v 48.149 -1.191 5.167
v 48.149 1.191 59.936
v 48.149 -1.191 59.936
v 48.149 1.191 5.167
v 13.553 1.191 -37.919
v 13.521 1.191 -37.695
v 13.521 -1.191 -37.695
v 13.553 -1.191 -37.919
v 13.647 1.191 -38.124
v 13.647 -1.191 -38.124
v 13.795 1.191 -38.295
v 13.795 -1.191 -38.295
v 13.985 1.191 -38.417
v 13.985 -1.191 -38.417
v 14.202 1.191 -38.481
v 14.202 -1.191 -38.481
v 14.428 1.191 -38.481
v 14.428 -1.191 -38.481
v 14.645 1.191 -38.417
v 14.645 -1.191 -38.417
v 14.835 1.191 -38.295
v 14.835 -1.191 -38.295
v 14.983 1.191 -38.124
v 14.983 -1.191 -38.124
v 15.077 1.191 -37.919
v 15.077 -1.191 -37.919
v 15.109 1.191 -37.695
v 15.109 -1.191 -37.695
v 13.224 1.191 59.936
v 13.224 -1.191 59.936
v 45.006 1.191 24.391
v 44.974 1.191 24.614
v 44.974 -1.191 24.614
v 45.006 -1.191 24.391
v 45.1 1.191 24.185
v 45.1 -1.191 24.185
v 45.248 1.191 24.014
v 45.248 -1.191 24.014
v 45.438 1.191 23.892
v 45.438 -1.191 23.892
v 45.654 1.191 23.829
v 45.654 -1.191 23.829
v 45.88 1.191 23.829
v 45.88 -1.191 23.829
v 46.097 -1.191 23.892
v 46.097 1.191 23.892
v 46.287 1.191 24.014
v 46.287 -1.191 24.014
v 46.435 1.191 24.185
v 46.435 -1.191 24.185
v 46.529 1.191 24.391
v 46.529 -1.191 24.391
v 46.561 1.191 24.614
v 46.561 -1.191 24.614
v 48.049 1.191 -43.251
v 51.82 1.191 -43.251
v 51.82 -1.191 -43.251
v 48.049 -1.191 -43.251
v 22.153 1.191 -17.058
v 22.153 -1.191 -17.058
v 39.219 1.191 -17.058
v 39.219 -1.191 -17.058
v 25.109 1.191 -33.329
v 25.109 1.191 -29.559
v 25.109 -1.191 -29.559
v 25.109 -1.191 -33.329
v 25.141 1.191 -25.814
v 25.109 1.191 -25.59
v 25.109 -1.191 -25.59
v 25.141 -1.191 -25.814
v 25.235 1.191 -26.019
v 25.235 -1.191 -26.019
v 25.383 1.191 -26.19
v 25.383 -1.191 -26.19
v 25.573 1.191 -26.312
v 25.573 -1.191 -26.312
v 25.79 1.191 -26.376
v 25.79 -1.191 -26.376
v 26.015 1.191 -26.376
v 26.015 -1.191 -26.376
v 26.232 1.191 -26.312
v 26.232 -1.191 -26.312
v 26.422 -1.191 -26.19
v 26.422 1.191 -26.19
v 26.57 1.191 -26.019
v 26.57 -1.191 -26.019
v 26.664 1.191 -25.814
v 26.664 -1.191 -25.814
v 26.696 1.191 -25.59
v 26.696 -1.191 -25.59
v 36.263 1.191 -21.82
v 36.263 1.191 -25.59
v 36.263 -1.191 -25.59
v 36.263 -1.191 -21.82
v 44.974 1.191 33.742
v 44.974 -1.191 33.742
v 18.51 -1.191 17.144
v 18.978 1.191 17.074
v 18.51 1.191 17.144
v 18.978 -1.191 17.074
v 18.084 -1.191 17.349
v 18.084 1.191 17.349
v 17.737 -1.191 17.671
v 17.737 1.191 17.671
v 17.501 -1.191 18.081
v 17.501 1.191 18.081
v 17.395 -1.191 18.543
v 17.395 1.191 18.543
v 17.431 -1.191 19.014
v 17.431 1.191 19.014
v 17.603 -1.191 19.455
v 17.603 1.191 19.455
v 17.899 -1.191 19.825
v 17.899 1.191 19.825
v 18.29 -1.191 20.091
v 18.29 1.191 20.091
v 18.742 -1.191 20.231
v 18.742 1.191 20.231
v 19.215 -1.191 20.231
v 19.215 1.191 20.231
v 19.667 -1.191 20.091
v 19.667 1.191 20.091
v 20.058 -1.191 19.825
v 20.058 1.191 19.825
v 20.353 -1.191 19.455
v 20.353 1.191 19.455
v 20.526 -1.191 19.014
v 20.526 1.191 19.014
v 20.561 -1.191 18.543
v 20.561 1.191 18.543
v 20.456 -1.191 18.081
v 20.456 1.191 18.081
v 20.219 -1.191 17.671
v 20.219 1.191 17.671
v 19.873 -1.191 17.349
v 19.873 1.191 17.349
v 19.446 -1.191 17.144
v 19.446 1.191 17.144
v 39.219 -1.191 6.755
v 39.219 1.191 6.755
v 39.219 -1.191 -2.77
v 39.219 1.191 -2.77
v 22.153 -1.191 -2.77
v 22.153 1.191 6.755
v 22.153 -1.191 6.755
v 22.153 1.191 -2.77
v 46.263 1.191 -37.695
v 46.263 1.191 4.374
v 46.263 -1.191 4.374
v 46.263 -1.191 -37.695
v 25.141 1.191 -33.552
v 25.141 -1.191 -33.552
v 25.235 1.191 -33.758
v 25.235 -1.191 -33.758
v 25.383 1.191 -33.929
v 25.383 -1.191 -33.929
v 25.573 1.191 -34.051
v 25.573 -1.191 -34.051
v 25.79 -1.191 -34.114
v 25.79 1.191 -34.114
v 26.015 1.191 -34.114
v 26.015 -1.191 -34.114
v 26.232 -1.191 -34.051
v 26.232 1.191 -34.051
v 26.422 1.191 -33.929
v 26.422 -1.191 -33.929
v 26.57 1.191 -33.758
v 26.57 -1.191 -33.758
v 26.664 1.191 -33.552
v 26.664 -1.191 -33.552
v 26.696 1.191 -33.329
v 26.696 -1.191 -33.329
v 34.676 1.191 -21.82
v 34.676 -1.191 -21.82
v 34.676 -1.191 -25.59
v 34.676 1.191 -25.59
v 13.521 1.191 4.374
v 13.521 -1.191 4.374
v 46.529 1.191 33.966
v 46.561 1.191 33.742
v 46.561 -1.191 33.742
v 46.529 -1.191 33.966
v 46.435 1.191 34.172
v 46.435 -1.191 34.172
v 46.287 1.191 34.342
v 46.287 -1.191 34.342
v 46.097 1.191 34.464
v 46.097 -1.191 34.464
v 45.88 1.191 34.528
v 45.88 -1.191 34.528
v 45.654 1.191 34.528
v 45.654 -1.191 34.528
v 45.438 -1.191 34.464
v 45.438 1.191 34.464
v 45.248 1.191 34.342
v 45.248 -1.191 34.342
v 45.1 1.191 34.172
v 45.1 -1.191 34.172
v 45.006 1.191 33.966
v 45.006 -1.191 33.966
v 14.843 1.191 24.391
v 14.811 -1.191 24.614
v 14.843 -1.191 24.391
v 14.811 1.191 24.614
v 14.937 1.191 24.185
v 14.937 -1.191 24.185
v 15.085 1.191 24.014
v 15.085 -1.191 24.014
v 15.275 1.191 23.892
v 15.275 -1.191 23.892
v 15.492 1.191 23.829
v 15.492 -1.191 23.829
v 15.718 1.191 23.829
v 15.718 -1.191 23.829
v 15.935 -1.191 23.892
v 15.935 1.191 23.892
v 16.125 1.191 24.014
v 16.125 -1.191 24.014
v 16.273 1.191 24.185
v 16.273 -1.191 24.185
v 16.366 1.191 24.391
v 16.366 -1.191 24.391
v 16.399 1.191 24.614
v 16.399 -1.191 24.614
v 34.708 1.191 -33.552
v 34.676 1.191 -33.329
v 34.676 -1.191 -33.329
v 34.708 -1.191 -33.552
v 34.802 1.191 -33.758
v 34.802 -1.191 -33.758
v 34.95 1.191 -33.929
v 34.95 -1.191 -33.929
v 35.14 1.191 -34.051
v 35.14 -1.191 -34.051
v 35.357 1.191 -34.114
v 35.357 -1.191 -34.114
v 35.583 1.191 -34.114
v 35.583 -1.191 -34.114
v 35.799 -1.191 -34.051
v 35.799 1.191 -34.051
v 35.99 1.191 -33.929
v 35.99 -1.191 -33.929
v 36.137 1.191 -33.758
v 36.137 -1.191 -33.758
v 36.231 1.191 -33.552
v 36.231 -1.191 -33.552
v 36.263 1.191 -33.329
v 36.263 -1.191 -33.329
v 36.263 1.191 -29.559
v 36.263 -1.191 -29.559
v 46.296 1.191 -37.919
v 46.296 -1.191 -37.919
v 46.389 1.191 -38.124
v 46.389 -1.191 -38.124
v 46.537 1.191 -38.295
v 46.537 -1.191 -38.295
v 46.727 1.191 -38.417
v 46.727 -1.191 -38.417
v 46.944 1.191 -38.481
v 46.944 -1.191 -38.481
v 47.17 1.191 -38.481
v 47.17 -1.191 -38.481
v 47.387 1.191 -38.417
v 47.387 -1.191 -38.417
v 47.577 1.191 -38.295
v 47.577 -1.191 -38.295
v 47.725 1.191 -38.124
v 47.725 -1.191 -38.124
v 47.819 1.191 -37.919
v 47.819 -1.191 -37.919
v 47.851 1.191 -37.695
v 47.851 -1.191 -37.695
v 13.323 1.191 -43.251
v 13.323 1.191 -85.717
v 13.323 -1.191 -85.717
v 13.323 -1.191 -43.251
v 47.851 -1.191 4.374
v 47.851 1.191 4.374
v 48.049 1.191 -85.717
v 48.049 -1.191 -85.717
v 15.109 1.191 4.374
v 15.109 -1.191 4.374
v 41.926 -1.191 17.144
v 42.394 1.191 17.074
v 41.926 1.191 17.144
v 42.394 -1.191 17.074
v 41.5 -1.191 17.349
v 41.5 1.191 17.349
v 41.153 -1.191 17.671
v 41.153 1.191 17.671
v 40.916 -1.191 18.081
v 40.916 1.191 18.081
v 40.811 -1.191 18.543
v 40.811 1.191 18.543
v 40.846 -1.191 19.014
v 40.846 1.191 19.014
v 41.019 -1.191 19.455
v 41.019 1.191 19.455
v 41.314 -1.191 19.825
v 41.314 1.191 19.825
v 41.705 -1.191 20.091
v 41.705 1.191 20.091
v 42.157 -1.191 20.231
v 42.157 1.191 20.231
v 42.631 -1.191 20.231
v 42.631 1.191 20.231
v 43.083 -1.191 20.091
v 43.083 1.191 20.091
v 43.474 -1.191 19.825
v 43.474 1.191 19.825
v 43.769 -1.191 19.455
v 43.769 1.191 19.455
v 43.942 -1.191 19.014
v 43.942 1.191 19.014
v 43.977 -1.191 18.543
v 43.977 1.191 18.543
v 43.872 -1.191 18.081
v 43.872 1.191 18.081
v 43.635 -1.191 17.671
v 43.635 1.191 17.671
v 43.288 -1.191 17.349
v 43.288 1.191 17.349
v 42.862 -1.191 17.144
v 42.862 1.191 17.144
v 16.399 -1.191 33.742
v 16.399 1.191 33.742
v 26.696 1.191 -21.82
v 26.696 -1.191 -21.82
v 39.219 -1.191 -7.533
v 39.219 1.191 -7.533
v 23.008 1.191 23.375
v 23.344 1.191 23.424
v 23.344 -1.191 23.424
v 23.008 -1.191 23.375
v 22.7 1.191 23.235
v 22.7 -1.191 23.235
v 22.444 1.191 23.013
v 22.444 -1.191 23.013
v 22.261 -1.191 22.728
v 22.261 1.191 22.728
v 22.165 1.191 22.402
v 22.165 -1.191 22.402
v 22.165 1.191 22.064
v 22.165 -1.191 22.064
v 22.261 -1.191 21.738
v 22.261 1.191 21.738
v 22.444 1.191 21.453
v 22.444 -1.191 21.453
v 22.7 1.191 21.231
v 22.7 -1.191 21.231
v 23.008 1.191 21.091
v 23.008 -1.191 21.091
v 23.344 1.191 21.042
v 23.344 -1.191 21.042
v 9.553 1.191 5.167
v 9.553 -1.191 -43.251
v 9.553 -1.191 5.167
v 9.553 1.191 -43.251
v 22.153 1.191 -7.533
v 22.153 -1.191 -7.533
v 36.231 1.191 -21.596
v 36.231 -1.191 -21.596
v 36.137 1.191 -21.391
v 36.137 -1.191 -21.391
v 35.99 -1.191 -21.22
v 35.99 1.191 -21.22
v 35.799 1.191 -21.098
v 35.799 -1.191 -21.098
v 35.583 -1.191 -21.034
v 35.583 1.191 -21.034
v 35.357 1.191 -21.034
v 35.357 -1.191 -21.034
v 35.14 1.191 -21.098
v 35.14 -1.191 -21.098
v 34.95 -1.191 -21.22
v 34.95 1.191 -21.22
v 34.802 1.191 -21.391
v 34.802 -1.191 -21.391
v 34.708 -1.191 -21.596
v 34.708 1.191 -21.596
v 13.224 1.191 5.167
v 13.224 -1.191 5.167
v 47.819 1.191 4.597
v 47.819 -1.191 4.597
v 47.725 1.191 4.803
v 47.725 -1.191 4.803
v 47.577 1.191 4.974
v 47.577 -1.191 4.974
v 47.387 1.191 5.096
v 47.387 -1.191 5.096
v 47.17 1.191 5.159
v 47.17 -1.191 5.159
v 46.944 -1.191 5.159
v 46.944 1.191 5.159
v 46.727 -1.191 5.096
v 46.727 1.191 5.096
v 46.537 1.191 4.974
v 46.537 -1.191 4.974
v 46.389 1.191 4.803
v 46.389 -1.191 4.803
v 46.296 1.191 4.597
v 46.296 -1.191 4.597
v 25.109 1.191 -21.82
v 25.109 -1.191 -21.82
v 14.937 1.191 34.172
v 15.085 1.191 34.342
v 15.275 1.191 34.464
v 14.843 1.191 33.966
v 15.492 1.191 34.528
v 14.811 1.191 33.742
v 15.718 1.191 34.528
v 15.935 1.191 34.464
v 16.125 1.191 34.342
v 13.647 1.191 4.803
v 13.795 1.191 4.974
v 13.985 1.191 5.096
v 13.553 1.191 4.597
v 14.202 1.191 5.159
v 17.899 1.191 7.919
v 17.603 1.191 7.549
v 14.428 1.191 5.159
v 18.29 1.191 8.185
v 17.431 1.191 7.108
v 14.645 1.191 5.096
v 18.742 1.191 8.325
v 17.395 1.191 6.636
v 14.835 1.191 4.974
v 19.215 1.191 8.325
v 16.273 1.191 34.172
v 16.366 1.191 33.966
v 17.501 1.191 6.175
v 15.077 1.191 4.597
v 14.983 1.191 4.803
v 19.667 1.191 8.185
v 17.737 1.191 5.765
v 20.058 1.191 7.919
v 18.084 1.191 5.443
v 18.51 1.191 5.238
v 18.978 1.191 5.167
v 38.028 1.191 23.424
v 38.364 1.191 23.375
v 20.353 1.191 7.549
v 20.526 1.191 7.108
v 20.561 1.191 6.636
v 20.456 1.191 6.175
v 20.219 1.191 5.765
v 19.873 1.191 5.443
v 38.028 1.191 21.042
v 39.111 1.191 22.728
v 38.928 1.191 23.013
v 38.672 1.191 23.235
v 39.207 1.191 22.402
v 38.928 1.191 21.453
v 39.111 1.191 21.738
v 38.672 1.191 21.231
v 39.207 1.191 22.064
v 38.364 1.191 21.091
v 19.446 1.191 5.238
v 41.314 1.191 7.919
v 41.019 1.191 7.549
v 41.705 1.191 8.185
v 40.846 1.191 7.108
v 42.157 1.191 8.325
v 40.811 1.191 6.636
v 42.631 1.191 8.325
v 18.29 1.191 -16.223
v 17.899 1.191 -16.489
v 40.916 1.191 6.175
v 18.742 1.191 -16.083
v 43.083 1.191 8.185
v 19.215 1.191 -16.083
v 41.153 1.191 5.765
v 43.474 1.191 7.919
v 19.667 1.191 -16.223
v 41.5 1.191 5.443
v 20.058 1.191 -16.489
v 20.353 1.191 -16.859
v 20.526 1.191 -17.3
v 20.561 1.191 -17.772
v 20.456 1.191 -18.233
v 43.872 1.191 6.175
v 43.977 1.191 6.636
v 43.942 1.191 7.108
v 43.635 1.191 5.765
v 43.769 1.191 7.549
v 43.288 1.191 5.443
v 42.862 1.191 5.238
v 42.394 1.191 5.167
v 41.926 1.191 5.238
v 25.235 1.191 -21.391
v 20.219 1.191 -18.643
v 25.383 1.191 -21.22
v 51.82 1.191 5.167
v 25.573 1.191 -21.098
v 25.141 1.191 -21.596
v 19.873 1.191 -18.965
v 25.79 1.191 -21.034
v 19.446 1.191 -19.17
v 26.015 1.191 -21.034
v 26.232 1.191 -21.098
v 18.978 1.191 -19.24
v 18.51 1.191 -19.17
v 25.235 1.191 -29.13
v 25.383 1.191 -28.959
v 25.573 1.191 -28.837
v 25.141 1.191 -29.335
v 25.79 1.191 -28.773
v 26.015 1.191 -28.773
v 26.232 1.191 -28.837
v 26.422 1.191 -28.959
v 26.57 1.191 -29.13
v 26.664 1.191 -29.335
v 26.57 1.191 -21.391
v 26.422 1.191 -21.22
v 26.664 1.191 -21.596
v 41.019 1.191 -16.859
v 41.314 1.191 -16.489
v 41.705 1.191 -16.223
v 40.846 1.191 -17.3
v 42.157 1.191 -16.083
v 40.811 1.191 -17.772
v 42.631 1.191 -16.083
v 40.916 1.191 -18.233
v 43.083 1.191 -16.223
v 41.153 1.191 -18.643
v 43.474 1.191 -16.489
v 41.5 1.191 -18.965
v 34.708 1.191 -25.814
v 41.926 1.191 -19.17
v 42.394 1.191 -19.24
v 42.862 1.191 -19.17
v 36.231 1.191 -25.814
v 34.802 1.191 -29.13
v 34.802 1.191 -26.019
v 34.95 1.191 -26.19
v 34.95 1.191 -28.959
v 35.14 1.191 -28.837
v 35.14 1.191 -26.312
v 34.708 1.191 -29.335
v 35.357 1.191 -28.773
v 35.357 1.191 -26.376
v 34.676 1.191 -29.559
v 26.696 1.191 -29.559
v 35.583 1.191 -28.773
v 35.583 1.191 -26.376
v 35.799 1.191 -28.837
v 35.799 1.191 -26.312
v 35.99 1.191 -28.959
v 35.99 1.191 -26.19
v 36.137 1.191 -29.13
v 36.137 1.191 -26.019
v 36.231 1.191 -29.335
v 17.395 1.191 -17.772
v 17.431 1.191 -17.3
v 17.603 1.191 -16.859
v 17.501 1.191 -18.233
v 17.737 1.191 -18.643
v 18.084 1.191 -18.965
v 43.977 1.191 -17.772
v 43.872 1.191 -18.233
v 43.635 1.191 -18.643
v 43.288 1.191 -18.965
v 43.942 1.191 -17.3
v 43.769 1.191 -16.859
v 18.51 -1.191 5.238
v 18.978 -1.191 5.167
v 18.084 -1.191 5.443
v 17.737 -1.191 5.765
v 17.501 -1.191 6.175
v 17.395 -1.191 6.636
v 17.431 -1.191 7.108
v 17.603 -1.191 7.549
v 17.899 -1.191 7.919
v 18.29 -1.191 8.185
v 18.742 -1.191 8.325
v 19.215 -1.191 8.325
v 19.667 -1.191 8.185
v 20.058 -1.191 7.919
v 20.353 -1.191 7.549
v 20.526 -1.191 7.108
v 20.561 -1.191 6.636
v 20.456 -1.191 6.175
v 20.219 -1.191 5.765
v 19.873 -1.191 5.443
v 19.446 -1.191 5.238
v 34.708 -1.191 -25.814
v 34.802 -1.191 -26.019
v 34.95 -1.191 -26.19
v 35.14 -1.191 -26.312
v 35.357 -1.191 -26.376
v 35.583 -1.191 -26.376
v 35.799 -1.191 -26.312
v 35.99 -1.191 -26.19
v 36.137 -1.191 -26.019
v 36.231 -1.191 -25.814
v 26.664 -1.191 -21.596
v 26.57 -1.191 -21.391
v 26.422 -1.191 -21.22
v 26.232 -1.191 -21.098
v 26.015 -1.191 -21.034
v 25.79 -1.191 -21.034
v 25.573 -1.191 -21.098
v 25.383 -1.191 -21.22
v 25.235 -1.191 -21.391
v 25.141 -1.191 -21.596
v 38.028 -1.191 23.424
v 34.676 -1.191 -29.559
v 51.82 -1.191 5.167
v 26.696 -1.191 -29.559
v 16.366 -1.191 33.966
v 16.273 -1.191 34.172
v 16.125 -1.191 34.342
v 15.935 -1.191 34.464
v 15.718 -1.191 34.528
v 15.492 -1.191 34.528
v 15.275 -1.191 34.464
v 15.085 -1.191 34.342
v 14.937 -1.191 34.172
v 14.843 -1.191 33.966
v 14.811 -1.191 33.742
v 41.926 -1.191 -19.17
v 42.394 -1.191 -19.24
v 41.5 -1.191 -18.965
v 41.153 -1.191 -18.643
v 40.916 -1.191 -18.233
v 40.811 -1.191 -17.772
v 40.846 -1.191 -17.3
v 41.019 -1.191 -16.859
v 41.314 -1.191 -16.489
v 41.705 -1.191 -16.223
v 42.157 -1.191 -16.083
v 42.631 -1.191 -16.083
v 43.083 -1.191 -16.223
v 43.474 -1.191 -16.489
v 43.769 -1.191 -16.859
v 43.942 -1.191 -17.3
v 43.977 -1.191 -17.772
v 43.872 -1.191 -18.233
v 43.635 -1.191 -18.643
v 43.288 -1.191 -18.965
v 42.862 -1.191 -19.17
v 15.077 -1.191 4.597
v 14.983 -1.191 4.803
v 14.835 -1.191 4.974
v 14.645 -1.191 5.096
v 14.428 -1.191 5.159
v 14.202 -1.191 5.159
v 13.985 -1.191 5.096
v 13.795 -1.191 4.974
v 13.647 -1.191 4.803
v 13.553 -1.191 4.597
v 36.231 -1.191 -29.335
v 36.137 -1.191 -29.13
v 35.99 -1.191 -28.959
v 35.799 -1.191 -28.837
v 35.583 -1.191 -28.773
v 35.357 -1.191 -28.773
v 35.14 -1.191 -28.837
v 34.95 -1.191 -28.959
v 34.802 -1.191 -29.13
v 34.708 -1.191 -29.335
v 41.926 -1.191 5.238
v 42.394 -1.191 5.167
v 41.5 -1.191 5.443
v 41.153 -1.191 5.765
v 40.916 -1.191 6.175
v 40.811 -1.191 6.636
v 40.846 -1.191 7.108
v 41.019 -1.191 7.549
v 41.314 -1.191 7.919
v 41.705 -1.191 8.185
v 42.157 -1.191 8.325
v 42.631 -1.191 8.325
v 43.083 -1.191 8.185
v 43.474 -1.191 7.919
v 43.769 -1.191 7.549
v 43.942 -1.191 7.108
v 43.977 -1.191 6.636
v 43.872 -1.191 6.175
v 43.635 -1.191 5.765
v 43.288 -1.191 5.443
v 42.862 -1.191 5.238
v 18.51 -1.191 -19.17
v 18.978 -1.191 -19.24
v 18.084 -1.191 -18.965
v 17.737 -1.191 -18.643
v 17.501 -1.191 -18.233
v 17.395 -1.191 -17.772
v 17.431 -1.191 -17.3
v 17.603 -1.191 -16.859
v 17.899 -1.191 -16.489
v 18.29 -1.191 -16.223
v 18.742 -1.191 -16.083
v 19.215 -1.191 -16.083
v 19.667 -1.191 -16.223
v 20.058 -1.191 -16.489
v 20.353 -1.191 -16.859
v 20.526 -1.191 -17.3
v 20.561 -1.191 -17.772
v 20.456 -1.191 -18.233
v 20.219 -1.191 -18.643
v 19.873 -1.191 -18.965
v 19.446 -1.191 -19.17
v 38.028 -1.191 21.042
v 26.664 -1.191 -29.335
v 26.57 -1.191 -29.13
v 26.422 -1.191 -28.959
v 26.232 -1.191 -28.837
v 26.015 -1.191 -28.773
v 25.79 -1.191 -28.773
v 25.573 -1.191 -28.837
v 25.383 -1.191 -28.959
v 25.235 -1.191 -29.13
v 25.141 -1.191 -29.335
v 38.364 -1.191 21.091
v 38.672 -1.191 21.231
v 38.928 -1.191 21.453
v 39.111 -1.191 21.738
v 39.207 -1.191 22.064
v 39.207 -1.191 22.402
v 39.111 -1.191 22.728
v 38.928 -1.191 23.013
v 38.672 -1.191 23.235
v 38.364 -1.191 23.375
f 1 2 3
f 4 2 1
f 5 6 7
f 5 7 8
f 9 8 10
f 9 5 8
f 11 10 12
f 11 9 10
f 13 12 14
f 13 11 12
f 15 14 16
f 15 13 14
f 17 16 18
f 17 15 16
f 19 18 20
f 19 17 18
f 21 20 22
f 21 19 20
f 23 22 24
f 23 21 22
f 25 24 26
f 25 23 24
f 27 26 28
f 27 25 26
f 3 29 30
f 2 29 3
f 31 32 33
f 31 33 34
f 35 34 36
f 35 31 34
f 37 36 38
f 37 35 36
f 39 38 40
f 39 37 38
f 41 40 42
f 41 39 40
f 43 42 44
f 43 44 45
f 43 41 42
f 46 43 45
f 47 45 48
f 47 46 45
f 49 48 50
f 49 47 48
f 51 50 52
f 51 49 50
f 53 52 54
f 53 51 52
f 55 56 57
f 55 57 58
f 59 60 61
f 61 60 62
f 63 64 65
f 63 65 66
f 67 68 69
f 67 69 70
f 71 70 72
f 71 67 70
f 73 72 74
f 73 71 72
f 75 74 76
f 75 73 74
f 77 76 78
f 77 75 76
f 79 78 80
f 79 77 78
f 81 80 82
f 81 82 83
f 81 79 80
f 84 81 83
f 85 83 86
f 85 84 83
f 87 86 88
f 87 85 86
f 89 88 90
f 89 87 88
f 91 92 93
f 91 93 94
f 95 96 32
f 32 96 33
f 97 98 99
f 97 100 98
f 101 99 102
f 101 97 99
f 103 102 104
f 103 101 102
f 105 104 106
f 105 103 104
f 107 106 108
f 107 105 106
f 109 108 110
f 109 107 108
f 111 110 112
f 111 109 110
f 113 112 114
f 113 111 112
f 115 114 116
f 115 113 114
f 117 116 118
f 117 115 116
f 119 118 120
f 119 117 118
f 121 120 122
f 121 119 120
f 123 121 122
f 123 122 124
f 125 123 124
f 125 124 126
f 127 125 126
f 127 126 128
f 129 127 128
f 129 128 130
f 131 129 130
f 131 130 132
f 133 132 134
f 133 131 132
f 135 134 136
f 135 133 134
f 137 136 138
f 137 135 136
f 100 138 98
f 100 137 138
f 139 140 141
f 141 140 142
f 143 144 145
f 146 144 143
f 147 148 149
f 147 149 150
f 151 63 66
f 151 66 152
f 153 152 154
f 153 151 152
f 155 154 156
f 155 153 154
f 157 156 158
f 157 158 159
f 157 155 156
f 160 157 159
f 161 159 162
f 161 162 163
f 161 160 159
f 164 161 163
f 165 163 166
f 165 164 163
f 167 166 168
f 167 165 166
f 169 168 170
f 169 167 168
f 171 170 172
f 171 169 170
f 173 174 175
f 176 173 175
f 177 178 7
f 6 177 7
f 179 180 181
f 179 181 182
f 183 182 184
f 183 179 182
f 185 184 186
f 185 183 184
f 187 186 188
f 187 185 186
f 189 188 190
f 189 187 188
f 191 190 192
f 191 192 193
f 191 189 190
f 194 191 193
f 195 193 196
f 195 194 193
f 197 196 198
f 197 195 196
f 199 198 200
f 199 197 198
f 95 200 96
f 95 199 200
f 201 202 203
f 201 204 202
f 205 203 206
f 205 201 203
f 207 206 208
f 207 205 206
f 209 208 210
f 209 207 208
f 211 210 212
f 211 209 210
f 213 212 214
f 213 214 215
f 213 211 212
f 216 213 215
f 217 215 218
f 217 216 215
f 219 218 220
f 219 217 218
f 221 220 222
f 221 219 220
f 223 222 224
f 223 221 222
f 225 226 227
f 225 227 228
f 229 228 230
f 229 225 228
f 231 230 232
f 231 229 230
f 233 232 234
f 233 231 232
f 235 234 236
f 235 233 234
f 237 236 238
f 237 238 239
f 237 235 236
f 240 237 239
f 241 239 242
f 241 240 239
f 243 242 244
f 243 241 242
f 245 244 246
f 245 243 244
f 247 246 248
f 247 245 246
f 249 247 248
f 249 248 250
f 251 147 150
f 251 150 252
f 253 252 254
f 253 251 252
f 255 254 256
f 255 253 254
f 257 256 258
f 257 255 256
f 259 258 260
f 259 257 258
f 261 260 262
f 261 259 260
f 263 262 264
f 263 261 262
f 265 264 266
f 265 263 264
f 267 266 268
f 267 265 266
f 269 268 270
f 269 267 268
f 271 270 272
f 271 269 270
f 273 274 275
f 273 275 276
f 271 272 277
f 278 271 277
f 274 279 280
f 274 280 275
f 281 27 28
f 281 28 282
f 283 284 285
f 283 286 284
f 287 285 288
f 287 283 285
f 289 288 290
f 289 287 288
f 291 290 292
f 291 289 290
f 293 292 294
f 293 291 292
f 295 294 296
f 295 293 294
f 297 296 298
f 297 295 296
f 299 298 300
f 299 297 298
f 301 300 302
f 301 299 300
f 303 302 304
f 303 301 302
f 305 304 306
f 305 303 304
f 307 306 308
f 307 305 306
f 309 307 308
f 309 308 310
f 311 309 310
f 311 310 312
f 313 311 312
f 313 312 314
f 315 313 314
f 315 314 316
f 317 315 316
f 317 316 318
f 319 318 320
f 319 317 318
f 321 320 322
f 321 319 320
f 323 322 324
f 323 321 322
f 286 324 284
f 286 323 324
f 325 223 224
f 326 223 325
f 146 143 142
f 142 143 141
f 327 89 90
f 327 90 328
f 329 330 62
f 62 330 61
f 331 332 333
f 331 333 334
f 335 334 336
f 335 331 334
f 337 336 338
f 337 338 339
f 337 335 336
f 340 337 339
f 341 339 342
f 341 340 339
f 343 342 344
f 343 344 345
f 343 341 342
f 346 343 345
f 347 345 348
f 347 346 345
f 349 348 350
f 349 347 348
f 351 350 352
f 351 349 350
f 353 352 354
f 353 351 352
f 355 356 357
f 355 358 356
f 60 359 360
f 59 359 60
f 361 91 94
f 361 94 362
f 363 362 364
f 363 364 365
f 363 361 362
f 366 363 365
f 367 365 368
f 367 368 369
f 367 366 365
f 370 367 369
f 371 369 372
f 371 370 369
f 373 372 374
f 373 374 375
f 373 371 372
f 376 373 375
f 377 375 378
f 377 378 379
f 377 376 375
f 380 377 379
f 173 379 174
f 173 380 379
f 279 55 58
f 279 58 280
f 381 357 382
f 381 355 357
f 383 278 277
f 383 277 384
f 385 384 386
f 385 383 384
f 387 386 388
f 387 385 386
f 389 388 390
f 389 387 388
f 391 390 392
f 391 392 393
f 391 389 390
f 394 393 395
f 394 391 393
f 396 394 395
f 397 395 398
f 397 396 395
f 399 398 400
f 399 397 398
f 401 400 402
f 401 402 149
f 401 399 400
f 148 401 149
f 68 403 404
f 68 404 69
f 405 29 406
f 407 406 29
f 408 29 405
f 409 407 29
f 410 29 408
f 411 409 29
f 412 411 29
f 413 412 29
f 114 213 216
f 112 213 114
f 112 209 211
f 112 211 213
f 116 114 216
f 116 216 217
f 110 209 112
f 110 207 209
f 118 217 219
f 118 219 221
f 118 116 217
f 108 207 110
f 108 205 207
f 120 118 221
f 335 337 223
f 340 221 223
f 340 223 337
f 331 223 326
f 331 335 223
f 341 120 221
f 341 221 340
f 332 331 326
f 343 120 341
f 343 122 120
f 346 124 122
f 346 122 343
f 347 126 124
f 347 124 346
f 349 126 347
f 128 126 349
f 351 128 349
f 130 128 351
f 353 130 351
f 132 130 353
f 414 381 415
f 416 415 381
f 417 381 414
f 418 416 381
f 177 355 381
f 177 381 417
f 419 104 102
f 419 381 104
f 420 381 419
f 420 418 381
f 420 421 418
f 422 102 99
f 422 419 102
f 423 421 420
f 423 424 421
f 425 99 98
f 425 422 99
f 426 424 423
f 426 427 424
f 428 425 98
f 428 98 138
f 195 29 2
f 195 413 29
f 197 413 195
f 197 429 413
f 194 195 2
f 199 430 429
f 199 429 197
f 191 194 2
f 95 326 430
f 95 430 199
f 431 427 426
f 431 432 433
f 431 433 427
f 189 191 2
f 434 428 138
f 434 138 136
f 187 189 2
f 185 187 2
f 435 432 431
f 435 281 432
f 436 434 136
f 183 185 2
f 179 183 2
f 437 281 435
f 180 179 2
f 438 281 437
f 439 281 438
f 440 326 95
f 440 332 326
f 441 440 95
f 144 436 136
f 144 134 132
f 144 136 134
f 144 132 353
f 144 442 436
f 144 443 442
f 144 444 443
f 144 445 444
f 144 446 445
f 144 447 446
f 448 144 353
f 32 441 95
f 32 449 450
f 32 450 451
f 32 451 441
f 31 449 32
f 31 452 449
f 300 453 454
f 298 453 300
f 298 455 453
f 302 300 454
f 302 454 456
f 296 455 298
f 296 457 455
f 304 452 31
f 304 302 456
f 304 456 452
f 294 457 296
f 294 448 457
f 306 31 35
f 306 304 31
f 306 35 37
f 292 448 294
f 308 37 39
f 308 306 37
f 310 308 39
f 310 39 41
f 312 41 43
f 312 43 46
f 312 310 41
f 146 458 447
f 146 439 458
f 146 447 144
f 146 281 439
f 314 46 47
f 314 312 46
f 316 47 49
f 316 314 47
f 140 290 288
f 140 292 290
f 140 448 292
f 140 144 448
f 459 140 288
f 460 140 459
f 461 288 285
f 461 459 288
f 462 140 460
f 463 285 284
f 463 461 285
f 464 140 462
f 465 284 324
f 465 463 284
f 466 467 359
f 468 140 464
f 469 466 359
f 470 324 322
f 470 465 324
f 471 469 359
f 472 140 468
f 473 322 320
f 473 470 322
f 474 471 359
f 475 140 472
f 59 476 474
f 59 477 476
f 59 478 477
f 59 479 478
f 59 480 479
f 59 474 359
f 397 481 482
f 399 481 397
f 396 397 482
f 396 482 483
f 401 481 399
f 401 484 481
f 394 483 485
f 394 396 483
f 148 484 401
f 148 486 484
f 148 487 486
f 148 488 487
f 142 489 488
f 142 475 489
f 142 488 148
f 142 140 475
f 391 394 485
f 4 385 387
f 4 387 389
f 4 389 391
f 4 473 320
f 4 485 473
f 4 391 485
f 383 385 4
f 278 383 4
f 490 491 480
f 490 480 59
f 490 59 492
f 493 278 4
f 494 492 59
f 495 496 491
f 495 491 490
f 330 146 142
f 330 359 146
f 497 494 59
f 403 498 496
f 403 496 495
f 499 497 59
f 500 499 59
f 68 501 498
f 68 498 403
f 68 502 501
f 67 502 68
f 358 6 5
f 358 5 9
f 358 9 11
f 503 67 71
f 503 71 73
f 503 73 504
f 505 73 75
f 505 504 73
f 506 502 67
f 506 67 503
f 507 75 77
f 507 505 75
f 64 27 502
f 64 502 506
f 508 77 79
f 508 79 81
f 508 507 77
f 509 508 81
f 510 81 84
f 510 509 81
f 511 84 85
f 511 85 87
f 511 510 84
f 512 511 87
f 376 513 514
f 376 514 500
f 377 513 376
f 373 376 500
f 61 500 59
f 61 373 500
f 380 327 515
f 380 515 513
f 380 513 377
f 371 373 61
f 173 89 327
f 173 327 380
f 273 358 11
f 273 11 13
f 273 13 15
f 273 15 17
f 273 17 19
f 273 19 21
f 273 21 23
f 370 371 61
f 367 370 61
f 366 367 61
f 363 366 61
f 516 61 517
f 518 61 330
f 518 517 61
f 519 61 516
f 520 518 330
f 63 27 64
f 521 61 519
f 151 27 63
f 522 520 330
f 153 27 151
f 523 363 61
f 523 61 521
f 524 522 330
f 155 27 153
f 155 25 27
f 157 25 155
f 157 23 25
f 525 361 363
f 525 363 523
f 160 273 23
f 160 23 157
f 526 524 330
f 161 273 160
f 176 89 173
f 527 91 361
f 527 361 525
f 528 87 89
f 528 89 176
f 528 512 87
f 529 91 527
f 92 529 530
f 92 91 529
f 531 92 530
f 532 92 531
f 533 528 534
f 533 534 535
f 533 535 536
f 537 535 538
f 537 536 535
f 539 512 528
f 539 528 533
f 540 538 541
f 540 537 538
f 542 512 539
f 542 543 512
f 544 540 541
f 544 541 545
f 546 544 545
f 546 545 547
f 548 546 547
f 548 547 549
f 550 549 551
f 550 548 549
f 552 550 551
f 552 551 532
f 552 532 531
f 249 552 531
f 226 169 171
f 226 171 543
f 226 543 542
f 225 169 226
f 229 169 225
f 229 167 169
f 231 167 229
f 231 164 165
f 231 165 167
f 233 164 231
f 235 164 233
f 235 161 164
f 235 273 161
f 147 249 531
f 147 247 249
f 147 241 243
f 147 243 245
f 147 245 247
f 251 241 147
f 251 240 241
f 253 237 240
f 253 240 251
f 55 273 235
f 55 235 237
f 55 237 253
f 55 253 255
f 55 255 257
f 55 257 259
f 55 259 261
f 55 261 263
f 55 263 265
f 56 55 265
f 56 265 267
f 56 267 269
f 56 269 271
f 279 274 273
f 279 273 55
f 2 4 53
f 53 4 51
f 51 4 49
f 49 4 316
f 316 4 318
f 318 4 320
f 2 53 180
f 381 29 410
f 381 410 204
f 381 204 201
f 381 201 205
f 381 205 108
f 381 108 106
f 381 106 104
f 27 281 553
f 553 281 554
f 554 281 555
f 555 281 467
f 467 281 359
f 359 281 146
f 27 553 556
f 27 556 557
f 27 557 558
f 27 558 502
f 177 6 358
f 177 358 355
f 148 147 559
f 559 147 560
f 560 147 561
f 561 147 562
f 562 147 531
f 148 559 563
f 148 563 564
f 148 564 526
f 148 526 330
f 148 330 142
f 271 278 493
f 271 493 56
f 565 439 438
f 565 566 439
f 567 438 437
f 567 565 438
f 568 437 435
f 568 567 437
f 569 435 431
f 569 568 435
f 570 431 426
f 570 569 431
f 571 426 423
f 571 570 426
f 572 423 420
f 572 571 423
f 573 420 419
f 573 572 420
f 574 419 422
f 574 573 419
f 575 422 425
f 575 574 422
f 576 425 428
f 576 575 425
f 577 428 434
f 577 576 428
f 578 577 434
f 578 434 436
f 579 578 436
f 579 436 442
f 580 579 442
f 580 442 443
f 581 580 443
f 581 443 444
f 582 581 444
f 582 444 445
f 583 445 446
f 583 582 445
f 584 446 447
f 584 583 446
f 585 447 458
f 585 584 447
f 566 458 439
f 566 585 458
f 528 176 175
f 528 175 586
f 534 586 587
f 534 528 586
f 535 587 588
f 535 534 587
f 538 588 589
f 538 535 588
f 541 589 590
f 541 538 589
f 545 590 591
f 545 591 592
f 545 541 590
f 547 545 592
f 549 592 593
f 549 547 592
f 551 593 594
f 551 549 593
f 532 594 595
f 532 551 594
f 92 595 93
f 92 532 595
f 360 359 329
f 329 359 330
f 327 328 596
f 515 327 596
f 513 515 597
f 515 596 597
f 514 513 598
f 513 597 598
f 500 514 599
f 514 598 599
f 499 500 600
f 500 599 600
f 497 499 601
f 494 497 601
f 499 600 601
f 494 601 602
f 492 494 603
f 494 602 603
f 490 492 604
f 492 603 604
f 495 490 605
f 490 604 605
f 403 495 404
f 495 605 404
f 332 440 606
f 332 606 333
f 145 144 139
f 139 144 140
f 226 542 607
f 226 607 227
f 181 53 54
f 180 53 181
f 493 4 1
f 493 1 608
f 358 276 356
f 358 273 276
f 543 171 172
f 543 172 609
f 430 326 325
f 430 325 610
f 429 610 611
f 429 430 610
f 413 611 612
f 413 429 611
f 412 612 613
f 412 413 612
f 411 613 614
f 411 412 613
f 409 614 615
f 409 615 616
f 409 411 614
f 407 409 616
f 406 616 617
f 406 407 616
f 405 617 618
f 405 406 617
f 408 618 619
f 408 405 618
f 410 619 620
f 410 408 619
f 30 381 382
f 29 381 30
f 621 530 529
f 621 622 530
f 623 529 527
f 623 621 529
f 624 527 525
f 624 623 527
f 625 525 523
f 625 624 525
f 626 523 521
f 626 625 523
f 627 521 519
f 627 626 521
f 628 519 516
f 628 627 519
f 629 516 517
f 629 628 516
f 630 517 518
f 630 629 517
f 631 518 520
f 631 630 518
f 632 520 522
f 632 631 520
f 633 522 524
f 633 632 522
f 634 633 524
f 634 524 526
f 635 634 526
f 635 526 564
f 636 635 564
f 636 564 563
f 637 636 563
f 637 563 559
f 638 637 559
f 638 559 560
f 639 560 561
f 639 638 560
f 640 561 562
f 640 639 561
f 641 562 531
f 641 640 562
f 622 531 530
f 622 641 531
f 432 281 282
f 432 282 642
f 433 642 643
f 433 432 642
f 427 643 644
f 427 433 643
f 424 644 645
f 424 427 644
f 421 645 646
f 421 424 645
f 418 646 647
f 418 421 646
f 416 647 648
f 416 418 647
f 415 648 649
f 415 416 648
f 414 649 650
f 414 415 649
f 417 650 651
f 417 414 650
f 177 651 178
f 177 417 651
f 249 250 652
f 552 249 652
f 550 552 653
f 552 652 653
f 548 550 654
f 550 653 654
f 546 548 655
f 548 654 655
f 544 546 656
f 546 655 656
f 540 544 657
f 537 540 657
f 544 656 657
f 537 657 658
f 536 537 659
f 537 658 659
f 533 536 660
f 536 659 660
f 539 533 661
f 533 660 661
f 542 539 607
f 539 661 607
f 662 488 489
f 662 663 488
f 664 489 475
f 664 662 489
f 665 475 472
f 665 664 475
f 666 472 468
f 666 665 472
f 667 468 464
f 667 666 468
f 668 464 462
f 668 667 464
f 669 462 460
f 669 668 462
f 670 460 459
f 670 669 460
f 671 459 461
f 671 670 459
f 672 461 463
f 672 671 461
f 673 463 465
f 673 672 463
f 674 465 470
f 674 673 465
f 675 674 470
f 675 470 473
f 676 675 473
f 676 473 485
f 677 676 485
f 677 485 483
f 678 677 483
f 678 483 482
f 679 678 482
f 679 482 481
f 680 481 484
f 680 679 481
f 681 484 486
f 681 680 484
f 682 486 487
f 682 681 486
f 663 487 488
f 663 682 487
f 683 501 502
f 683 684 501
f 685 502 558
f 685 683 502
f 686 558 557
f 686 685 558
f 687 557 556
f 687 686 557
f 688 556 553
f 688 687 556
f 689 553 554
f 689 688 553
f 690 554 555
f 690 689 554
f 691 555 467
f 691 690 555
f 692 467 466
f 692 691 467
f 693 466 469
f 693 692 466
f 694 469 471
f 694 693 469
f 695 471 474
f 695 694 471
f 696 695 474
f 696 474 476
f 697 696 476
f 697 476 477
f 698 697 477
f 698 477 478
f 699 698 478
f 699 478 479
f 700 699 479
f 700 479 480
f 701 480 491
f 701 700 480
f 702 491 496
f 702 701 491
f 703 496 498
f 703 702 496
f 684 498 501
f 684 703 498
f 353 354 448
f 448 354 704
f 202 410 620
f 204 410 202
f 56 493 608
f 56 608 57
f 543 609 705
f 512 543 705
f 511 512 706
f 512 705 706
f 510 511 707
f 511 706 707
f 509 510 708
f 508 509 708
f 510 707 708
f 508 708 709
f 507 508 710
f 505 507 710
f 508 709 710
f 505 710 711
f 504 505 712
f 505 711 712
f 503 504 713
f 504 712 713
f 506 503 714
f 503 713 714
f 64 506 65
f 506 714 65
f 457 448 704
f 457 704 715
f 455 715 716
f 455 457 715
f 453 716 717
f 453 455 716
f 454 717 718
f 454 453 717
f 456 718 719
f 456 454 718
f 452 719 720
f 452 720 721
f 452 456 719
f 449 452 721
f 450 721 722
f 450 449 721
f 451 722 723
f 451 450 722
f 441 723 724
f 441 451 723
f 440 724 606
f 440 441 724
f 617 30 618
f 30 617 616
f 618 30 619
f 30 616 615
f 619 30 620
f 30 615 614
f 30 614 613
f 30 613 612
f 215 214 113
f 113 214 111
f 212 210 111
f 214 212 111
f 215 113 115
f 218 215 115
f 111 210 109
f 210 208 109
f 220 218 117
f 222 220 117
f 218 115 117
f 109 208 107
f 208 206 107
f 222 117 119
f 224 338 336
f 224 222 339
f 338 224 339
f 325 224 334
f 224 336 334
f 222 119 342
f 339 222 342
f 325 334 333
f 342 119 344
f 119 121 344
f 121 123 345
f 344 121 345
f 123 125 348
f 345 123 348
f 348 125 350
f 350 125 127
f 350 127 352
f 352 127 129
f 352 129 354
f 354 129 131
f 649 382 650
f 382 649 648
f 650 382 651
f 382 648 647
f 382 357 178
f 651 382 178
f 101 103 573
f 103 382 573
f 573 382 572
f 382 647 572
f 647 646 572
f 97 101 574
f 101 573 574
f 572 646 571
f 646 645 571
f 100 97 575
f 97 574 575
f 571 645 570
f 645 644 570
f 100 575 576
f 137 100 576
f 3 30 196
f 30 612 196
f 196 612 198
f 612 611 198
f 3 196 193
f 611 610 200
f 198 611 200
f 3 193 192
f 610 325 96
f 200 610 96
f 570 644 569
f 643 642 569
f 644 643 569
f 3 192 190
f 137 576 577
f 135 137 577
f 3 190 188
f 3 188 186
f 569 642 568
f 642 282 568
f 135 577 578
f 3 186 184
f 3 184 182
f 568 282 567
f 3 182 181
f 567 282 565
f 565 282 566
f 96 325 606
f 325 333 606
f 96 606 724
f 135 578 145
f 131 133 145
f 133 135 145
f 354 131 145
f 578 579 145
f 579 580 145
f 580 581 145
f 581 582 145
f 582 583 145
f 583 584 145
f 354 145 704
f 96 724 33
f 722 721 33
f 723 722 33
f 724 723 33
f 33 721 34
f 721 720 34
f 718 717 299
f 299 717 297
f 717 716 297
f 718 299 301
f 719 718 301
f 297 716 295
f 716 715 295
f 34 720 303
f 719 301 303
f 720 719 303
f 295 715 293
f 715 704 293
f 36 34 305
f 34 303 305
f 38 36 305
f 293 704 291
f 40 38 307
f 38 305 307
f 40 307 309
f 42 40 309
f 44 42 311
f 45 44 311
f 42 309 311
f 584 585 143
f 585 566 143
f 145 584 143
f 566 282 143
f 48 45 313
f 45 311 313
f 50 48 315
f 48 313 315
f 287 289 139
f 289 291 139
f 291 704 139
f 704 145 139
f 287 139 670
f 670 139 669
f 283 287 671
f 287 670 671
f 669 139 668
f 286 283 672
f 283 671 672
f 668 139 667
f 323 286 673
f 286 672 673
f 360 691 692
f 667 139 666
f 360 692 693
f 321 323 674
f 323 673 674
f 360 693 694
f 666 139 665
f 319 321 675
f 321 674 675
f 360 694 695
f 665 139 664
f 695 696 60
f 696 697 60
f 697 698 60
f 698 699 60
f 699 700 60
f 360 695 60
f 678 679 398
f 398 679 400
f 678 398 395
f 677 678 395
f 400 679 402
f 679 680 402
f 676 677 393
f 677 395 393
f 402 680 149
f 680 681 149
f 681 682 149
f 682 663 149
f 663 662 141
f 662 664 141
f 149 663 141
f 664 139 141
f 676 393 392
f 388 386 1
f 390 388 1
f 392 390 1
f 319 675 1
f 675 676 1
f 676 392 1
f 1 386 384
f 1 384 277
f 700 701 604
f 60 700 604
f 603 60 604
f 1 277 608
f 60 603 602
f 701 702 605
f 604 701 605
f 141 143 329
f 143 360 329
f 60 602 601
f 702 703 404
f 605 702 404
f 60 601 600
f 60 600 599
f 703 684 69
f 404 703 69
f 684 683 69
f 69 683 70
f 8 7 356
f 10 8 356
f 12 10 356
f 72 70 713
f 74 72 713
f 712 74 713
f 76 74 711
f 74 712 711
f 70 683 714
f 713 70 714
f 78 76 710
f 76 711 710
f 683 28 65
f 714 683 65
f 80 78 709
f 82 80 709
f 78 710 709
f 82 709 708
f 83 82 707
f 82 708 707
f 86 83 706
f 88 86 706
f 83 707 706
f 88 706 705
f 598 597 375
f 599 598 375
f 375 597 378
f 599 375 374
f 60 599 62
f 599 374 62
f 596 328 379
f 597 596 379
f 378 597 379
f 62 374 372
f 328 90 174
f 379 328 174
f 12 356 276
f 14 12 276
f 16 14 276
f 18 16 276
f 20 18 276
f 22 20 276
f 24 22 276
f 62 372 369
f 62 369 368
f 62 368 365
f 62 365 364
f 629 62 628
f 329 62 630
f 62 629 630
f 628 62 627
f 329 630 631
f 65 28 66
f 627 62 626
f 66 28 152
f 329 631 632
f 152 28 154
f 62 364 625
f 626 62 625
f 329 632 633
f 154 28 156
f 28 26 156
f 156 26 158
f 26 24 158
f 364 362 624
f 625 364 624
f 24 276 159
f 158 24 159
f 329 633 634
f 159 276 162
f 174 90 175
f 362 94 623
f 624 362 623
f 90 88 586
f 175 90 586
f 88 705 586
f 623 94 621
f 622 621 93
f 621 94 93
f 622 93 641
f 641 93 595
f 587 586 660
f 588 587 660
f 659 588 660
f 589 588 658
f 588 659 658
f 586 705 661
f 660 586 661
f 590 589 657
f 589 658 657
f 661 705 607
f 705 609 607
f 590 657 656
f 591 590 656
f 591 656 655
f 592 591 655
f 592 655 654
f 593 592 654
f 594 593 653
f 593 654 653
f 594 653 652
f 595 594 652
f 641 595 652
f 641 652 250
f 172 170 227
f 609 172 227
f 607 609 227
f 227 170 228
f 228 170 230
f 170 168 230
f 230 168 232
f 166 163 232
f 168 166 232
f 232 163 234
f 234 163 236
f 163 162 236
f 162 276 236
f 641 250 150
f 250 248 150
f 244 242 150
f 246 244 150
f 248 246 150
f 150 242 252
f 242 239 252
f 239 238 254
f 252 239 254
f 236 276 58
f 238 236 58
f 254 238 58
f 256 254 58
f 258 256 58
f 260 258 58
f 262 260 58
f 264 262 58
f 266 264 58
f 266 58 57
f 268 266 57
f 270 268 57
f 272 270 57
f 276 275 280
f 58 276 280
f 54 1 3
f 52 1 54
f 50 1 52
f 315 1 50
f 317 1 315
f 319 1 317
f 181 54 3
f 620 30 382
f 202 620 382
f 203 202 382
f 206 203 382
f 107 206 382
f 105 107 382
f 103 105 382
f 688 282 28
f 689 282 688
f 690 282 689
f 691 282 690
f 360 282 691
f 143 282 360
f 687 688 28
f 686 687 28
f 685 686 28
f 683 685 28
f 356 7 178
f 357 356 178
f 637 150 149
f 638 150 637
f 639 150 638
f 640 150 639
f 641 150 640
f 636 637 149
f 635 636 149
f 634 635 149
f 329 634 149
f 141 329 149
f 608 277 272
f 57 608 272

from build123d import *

# Parameters (mm, degrees)
SKETCH1_W           = 17.065625
SKETCH1_H           = 9.525
SKETCH1_R           = 1.5875
BOSS_EXTRUDE2_DEPTH = 1.190625


with BuildPart() as part:
    # Sketch1 → Boss-Extrude2 (new, symmetric)
    with BuildSketch(Plane(origin=(0, 0, 0), x_dir=(1, 0, 0), z_dir=(0, 1, 0))):
        Polygon((48.148623935, -59.93613473), (48.148623935, -5.16738473), (51.819717685, -5.16738473), (51.819717685, 43.25136527), (48.049405185, 43.25136527), (48.049405185, 85.71699027), (13.322842685, 85.71699027), (13.322842685, 43.25136527), (9.552530185, 43.25136527), (9.552530185, -5.16738473), (13.223623935, -5.16738473), (13.223623935, -59.93613473), align=None)
        with Locations((30.686123935, 12.29511527)):
            Rectangle(SKETCH1_W, SKETCH1_H, mode=Mode.SUBTRACT)
        with Locations((30.686123935, -1.99238473)):
            Rectangle(SKETCH1_W, SKETCH1_H, mode=Mode.SUBTRACT)
        with BuildLine():
            Line((16.398623935, -24.61425973), (16.398623935, -33.74238473))
            ThreePointArc((16.398623935, -33.74238473), (15.604873935, -34.53613473), (14.811123935, -33.74238473))
            Line((14.811123935, -33.74238473), (14.811123935, -24.61425973))
            ThreePointArc((14.811123935, -24.61425973), (15.604873935, -23.82050973), (16.398623935, -24.61425973))
        make_face(mode=Mode.SUBTRACT)
        with Locations(Location((18.978311435, -18.66113473, 0), (0, 0, 90))):
            Circle(SKETCH1_R, mode=Mode.SUBTRACT)
        with Locations(Location((18.978311435, -6.75488473, 0), (0, 0, 90))):
            Circle(SKETCH1_R, mode=Mode.SUBTRACT)
        with BuildLine():
            ThreePointArc((23.343936435, -23.42363473), (22.153311435, -22.23300973), (23.343936435, -21.04238473))
            Line((23.343936435, -21.04238473), (38.028311435, -21.04238473))
            ThreePointArc((38.028311435, -21.04238473), (39.218936435, -22.23300973), (38.028311435, -23.42363473))
            Line((38.028311435, -23.42363473), (23.343936435, -23.42363473))
        make_face(mode=Mode.SUBTRACT)
        with BuildLine():
            ThreePointArc((46.561123935, -33.74238473), (45.767373935, -34.53613473), (44.973623935, -33.74238473))
            Line((44.973623935, -33.74238473), (44.973623935, -24.61425973))
            ThreePointArc((44.973623935, -24.61425973), (45.767373935, -23.82050973), (46.561123935, -24.61425973))
            Line((46.561123935, -24.61425973), (46.561123935, -33.74238473))
        make_face(mode=Mode.SUBTRACT)
        with Locations(Location((42.393936435, -18.66113473, 0), (0, 0, 90))):
            Circle(SKETCH1_R, mode=Mode.SUBTRACT)
        with Locations(Location((42.393936435, -6.75488473, 0), (0, 0, 90))):
            Circle(SKETCH1_R, mode=Mode.SUBTRACT)
        with BuildLine():
            ThreePointArc((15.108780185, -4.37363473), (14.315030185, -5.16738473), (13.521280185, -4.37363473))
            Line((13.521280185, -4.37363473), (13.521280185, 37.69511527))
            ThreePointArc((13.521280185, 37.69511527), (14.315030185, 38.48886527), (15.108780185, 37.69511527))
            Line((15.108780185, 37.69511527), (15.108780185, -4.37363473))
        make_face(mode=Mode.SUBTRACT)
        with Locations(Location((18.978311435, 17.65292777, 0), (0, 0, 90))):
            Circle(SKETCH1_R, mode=Mode.SUBTRACT)
        with BuildLine():
            Line((26.696280185, 25.590053861), (26.696280185, 21.82011527))
            ThreePointArc((26.696280185, 21.82011527), (25.902530185, 21.02636527), (25.108780185, 21.82011527))
            Line((25.108780185, 21.82011527), (25.108780185, 25.590053861))
            ThreePointArc((25.108780185, 25.590053861), (25.902530185, 26.383803861), (26.696280185, 25.590053861))
        make_face(mode=Mode.SUBTRACT)
        with BuildLine():
            Line((26.696280185, 33.328742451), (26.696280185, 29.558803861))
            ThreePointArc((26.696280185, 29.558803861), (25.902530185, 28.765053861), (25.108780185, 29.558803861))
            Line((25.108780185, 29.558803861), (25.108780185, 33.328742451))
            ThreePointArc((25.108780185, 33.328742451), (25.902530185, 34.122492451), (26.696280185, 33.328742451))
        make_face(mode=Mode.SUBTRACT)
        with BuildLine():
            ThreePointArc((46.263467685, 37.69511527), (47.057217685, 38.48886527), (47.850967685, 37.69511527))
            Line((47.850967685, 37.69511527), (47.850967685, -4.37363473))
            ThreePointArc((47.850967685, -4.37363473), (47.057217685, -5.16738473), (46.263467685, -4.37363473))
            Line((46.263467685, -4.37363473), (46.263467685, 37.69511527))
        make_face(mode=Mode.SUBTRACT)
        with Locations(Location((42.393936435, 17.65292777, 0), (0, 0, 90))):
            Circle(SKETCH1_R, mode=Mode.SUBTRACT)
        with BuildLine():
            ThreePointArc((36.263467685, 21.82011527), (35.469717685, 21.02636527), (34.675967685, 21.82011527))
            Line((34.675967685, 21.82011527), (34.675967685, 25.590053861))
            ThreePointArc((34.675967685, 25.590053861), (35.469717685, 26.383803861), (36.263467685, 25.590053861))
            Line((36.263467685, 25.590053861), (36.263467685, 21.82011527))
        make_face(mode=Mode.SUBTRACT)
        with BuildLine():
            ThreePointArc((36.263467685, 29.558803861), (35.469717685, 28.765053861), (34.675967685, 29.558803861))
            Line((34.675967685, 29.558803861), (34.675967685, 33.328742451))
            ThreePointArc((34.675967685, 33.328742451), (35.469717685, 34.122492451), (36.263467685, 33.328742451))
            Line((36.263467685, 33.328742451), (36.263467685, 29.558803861))
        make_face(mode=Mode.SUBTRACT)
    extrude(amount=BOSS_EXTRUDE2_DEPTH, both=True)


solid = part.part
